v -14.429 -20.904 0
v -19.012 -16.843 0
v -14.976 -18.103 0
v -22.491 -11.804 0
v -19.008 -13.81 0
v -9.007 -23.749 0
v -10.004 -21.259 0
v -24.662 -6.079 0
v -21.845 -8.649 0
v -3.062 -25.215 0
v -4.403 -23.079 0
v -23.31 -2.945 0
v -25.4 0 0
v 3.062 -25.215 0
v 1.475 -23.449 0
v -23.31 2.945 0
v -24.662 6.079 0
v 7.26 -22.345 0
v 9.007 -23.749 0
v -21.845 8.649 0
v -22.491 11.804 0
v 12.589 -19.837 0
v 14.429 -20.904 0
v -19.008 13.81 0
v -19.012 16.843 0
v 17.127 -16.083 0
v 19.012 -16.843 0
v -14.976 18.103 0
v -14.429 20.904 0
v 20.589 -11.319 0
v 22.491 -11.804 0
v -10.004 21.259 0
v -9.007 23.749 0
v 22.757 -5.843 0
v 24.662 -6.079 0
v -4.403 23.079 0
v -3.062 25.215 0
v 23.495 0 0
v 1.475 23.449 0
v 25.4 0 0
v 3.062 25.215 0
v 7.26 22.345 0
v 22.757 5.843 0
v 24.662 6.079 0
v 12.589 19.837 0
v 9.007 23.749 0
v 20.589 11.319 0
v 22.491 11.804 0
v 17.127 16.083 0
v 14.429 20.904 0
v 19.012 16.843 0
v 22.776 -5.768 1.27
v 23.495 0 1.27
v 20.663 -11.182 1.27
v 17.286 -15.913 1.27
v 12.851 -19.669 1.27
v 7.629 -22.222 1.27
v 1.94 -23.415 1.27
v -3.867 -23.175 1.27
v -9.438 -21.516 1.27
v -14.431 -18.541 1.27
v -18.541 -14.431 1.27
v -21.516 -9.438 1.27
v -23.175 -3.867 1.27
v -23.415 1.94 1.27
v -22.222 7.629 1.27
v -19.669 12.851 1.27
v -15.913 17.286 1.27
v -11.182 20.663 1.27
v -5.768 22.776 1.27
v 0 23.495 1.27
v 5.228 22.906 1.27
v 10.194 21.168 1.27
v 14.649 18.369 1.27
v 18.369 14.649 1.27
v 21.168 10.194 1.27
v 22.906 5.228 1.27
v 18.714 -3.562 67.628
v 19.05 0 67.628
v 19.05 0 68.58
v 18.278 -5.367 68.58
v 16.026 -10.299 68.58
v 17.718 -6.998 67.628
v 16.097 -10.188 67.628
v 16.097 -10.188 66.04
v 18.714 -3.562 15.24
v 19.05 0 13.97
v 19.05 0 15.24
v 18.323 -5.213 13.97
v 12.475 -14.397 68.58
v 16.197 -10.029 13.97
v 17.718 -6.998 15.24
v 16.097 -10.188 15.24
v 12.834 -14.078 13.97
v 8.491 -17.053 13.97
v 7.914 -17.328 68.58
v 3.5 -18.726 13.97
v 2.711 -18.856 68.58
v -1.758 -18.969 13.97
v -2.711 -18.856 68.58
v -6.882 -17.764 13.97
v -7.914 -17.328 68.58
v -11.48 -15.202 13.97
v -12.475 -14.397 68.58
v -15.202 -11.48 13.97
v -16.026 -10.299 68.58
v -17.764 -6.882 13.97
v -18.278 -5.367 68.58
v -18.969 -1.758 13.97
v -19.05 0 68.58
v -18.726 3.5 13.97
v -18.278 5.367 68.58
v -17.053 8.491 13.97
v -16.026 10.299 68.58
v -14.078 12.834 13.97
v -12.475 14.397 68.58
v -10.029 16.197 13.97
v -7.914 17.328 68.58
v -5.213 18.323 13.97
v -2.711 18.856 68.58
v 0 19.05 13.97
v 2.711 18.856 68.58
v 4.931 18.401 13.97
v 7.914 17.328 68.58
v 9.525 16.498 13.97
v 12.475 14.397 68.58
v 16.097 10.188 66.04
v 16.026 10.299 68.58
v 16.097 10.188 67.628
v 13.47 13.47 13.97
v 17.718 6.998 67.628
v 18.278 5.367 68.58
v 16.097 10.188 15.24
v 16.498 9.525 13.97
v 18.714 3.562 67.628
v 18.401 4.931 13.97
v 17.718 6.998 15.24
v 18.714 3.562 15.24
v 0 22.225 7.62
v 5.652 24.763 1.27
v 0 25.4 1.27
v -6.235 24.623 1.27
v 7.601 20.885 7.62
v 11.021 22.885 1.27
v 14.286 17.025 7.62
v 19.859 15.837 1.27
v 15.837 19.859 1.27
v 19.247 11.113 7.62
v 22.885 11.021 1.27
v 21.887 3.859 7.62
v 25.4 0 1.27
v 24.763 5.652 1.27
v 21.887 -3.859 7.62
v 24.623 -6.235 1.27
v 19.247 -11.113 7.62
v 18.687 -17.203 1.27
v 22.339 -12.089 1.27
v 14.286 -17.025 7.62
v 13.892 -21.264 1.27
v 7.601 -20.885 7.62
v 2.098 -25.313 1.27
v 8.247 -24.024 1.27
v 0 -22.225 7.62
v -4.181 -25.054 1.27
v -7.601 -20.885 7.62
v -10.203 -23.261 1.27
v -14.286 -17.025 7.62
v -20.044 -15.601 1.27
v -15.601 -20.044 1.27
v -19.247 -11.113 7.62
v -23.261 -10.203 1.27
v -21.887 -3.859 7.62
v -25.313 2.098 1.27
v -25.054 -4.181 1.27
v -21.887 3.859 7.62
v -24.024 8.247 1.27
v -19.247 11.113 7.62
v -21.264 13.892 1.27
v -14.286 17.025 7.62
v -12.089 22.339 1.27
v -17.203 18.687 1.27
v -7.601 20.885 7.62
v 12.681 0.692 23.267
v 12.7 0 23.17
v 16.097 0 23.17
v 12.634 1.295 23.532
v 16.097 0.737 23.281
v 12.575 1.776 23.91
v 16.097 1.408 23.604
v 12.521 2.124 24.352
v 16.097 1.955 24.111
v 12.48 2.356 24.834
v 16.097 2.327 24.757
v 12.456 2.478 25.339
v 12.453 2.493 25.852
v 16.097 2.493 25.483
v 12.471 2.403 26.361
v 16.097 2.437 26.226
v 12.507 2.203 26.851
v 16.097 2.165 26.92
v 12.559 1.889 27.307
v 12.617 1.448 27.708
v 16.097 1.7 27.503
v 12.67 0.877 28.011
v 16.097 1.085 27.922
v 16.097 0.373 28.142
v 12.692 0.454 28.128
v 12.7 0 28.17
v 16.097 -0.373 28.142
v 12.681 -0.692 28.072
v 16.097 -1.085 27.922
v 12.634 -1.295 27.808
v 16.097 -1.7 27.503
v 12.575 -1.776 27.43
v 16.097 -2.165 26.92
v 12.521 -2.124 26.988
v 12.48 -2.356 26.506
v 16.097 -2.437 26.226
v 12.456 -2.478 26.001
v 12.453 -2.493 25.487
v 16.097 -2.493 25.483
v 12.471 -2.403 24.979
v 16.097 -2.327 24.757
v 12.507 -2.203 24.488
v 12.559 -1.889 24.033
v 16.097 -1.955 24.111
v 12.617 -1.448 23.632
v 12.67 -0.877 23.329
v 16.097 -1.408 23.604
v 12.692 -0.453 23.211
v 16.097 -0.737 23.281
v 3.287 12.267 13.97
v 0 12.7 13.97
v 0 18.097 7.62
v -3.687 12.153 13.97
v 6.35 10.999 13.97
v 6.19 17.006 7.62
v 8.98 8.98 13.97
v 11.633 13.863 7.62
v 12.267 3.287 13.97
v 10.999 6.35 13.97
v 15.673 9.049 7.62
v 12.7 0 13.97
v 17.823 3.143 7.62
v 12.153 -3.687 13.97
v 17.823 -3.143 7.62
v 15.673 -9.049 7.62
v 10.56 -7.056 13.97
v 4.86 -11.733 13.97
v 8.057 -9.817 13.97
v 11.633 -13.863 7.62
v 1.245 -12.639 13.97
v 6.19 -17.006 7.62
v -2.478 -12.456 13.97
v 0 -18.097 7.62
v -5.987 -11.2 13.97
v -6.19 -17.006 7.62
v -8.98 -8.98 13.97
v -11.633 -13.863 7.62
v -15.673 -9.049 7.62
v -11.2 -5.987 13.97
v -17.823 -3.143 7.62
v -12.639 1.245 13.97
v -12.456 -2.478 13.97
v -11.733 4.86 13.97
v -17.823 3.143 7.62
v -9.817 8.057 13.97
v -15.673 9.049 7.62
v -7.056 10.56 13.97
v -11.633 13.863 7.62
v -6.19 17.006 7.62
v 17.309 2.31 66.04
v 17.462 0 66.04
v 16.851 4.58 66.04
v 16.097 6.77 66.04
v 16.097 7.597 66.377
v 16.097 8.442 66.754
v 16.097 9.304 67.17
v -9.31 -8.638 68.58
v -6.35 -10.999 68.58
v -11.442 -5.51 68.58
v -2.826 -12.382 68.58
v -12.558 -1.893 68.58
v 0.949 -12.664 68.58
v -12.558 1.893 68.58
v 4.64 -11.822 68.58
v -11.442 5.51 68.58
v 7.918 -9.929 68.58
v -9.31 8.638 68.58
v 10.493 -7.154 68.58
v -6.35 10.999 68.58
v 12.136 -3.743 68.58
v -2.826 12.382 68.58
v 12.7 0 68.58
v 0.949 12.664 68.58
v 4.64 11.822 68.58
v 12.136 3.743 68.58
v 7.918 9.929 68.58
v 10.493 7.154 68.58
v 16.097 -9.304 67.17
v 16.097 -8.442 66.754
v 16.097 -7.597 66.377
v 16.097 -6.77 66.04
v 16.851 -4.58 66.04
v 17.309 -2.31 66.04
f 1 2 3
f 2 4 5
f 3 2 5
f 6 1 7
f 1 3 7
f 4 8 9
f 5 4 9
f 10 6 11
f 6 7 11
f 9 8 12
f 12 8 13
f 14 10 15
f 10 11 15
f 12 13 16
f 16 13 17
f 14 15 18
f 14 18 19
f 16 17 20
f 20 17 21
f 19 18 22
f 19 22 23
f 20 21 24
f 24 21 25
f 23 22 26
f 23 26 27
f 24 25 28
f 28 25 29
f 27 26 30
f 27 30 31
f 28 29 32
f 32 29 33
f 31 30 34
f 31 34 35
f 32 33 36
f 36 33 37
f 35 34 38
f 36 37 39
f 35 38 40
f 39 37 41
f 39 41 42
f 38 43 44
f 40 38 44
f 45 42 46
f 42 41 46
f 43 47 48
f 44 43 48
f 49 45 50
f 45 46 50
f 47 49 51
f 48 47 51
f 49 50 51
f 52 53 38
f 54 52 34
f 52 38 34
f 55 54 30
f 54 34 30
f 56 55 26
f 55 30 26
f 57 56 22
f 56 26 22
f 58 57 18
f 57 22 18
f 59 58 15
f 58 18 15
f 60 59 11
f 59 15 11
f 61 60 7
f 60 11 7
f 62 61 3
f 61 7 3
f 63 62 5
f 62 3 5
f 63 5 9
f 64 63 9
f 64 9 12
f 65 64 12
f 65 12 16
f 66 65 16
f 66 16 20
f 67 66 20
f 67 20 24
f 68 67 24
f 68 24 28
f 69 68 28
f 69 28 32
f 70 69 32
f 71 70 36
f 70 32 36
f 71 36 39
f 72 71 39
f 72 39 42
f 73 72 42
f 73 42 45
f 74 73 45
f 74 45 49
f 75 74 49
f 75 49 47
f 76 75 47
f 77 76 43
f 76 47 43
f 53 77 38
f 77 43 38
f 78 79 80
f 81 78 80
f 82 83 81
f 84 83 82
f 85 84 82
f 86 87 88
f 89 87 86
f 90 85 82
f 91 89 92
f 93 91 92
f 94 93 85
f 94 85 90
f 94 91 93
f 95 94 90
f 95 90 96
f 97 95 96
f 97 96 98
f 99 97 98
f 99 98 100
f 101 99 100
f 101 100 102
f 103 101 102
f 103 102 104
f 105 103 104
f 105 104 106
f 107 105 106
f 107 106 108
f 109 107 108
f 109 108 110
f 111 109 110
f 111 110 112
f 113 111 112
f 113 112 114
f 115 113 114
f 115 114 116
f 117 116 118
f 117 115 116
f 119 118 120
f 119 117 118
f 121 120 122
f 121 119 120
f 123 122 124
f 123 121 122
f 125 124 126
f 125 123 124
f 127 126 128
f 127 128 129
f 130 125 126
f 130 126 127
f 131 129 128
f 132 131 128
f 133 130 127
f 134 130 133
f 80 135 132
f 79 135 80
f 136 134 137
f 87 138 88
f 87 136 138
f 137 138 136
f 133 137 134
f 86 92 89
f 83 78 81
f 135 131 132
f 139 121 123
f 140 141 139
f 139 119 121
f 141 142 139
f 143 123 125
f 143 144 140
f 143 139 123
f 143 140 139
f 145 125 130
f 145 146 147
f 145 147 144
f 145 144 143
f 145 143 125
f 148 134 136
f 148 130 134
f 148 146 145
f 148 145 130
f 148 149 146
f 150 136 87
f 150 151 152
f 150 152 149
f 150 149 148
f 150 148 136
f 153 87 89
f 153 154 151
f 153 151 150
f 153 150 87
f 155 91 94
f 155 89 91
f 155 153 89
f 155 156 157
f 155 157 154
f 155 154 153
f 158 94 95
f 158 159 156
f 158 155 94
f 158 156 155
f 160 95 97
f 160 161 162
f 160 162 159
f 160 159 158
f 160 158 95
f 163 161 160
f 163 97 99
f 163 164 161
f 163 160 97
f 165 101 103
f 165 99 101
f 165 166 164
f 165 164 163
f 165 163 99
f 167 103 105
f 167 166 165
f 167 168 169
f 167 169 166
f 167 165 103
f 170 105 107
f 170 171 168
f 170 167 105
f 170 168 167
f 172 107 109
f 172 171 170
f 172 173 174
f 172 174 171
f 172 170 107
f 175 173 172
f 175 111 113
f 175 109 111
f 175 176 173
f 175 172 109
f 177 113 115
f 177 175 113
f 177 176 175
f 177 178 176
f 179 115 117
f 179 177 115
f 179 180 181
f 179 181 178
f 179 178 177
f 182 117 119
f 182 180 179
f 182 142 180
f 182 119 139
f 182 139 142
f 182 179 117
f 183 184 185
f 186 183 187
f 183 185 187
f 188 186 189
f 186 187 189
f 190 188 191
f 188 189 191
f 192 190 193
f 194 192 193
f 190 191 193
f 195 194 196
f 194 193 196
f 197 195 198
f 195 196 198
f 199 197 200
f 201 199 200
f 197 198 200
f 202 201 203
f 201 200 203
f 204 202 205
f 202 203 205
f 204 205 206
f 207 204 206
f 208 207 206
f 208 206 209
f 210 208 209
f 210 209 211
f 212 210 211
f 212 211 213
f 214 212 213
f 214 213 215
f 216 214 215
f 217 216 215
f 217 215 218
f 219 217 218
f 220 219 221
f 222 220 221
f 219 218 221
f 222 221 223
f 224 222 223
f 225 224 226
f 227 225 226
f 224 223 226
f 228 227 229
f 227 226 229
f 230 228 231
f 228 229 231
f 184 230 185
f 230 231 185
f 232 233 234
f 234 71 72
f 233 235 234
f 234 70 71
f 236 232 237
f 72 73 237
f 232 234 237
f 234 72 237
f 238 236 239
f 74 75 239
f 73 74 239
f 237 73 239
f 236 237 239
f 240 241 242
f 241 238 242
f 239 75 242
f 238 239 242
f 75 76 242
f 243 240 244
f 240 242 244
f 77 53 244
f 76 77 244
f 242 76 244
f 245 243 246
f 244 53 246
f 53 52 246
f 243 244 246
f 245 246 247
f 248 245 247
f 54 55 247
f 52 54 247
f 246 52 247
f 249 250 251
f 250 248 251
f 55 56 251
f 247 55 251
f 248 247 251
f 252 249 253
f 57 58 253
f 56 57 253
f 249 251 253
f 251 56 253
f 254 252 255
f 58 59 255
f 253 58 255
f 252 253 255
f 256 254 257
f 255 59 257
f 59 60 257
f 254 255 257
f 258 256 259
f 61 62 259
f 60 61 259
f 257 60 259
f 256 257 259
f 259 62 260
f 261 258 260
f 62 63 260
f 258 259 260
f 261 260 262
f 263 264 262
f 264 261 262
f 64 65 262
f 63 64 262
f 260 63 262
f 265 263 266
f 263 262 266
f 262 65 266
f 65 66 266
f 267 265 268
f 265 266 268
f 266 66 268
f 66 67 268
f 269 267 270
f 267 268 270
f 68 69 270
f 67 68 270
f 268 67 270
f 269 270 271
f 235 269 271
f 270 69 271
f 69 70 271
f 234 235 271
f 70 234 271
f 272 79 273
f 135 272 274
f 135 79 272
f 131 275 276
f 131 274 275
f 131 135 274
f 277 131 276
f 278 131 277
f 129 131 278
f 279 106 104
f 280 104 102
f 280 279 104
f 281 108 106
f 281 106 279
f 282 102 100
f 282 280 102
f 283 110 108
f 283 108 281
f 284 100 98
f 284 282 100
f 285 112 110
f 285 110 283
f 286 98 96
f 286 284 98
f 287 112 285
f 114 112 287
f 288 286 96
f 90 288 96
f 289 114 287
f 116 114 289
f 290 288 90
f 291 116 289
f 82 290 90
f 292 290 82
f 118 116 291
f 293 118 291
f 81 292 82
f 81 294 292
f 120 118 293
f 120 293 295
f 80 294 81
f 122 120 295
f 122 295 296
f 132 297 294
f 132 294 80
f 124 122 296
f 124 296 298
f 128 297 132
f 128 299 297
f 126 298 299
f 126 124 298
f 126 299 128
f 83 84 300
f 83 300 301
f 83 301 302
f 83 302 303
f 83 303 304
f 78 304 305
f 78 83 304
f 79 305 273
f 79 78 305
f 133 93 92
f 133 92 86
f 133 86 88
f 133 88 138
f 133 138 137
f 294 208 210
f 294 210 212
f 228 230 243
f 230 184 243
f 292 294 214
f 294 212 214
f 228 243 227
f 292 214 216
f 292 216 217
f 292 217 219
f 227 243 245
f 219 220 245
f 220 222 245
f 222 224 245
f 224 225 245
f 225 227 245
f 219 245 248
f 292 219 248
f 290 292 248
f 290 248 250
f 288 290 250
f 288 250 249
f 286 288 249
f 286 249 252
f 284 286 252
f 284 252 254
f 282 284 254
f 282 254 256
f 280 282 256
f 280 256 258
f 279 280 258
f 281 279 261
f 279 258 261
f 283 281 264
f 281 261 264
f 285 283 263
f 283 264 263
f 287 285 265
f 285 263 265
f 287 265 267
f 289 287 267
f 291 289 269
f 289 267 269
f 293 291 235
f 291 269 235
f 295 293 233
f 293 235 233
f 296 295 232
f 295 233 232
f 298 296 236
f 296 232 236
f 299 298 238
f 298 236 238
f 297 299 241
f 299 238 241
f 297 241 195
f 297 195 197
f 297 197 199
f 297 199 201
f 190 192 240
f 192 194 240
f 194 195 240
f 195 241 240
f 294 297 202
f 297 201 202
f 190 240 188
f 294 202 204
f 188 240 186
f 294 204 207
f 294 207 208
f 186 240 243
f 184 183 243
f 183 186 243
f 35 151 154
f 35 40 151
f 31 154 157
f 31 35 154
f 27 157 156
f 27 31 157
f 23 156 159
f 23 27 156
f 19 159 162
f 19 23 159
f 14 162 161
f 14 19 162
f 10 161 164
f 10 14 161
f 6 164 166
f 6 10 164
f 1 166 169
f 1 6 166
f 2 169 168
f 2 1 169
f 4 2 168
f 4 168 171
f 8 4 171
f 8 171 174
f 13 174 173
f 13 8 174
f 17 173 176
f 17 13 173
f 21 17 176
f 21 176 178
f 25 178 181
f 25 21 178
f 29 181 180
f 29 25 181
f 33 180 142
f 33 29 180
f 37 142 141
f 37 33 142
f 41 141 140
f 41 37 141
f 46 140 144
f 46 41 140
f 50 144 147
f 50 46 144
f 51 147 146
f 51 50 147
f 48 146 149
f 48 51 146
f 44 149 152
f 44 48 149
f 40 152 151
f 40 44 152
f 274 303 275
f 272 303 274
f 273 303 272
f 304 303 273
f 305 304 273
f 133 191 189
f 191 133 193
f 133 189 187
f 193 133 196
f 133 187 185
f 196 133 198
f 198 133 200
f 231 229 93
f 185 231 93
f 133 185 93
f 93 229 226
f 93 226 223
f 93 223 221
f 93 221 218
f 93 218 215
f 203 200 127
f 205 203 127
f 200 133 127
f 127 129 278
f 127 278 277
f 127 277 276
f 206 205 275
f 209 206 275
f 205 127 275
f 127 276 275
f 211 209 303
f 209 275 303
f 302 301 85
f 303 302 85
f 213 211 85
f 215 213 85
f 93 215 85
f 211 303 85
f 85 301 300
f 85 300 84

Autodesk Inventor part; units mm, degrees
ref_plane "YZ Plane" through (0, 0, 0) normal (1, 0, 0) x (0, 1, 0)
ref_plane "XZ Plane" through (0, 0, 0) normal (0, 1, 0) x (-1, 0, 0)
ref_plane "XY Plane" through (0, 0, 0) normal (0, 0, 1) x (1, 0, 0)
sketch "Sketch1" plane through (0, 0, 0) normal (0, 0, 1) x (1, 0, 0)
  circle A0 centre (0, 0) radius 23.495
  circle A1 centre (0, 0) radius 25.4
  dimension "d4" = 46.99
  dimension "d5" = 50.8
extrude "Extrusion1" add sketch "Sketch1" along normal blind 1.27
ref_plane "Work Plane1" through (0, 0, 13.97) normal (0, 0, 1) x (1, 0, 0)
sketch "Sketch2" plane through (0, 0, 13.97) normal (0, 0, 1) x (1, 0, 0)
  circle A0 centre (0, 0) radius 19.05
  circle A1 centre (0, 0) radius 12.7
  dimension "d9" = 38.1
  dimension "d10" = 25.4
sketch "Sketch3" plane through (0, 0, 13.97) normal (0, 0, 1) x (1, 0, 0)
  circle A0 centre (0, 0) radius 10.795 projected
  line L0 (0, 10.795) -> (0, 7.0011) construction
ref_plane "Work Plane2" through (0, 10.795, 13.97) normal (1, 0, 0) x (0, -1, 0)
ref_plane "Work Plane3" through (0, 0, 15.24) normal (0, 0, 1) x (1, 0, 0)
sketch "Sketch5" plane through (0, 0, 15.24) normal (0, 0, 1) x (1, 0, 0)
  circle A0 centre (0, 0) radius 12.7
  circle A1 centre (0, 0) radius 19.05
  dimension "d20" = 38.1
  dimension "d21" = 25.4
extrude "Extrusion3" add sketch "Sketch5" along normal blind 50.8
sketch "Sketch6" plane through (0, 10.795, 13.97) normal (1, 0, 0) x (0, -1, 0)
  point P0 (10.795, 13.97)
extrude "Extrusion4" add sketch "Sketch2" along normal blind 1.27
sketch "Sketch7" plane through (0, 10.795, 13.97) normal (1, 0, 0) x (0, -1, 0)
  line L0 (-14.605, 12.7) -> (36.195, 12.7) projected
  line L1 (29.845, 0) -> (-8.255, 0) projected
  line L2 (-14.605, 12.7) -> (-8.255, 0)
  line L3 (-1.905, 0) -> (23.495, 0) projected
  line L4 (-8.255, 0) -> (-1.905, 0)
  line L5 (34.29, 12.7) -> (-12.7, 12.7) projected
  line L6 (-1.905, 0) -> (-12.7, 12.7)
  line L7 (-12.7, 12.7) -> (-14.605, 12.7)
  line L8 (10.795, 0) -> (10.795, 4.3567) construction
  point P0 (10.795, 13.97)
revolve "Revolution2" add sketch "Sketch7" angle 360 about axis through (0, 0, 13.97) along (0, 0, -1)
sketch "Sketch8" plane through (0, 10.795, 13.97) normal (1, 0, 0) x (0, -1, 0)
  point P0 (10.795, 13.97)
sketch "Sketch9" plane through (0, 0, 66.04) normal (0, 0, 1) x (1, 0, 0)
  circle A0 centre (0, 0) radius 19.05 projected
  line L0 (16.0969, 10.1879) -> (16.0969, -10.1879)
  arc A1 (16.0969, -10.1879) -> (16.0969, 10.1879) centre (0, 0) ccw
extrude "Extrusion5" cut sketch "Sketch9" against normal blind 50.8 contours A0 L0 picked at (16.6372, -2.3328)
sketch "Sketch10" plane through (16.0969, -10.1879, 66.04) normal (1, 0, 0) x (0, 0, -1)
  circle A0 centre (40.3701, 10.1879) radius 2.5
  point P0 (66.04, 10.1879)
  dimension "d24" = 5
extrude "Extrusion6" cut sketch "Sketch10" against normal blind 12.7
sketch "Sketch11" plane through (0, 0, 66.04) normal (0, 0, 1) x (1, 0, 0)
  circle A0 centre (0, 0) radius 19.05
  circle A1 centre (0, 0) radius 12.7
extrude "Extrusion7" add sketch "Sketch11" along normal blind 2.54
chamfer "Chamfer1" distance 1.5875 angle 45 2 edges at (18.2968, 5.3036, 66.04) (18.2968, -5.3036, 66.04)
properties part number "uvlight holder"
